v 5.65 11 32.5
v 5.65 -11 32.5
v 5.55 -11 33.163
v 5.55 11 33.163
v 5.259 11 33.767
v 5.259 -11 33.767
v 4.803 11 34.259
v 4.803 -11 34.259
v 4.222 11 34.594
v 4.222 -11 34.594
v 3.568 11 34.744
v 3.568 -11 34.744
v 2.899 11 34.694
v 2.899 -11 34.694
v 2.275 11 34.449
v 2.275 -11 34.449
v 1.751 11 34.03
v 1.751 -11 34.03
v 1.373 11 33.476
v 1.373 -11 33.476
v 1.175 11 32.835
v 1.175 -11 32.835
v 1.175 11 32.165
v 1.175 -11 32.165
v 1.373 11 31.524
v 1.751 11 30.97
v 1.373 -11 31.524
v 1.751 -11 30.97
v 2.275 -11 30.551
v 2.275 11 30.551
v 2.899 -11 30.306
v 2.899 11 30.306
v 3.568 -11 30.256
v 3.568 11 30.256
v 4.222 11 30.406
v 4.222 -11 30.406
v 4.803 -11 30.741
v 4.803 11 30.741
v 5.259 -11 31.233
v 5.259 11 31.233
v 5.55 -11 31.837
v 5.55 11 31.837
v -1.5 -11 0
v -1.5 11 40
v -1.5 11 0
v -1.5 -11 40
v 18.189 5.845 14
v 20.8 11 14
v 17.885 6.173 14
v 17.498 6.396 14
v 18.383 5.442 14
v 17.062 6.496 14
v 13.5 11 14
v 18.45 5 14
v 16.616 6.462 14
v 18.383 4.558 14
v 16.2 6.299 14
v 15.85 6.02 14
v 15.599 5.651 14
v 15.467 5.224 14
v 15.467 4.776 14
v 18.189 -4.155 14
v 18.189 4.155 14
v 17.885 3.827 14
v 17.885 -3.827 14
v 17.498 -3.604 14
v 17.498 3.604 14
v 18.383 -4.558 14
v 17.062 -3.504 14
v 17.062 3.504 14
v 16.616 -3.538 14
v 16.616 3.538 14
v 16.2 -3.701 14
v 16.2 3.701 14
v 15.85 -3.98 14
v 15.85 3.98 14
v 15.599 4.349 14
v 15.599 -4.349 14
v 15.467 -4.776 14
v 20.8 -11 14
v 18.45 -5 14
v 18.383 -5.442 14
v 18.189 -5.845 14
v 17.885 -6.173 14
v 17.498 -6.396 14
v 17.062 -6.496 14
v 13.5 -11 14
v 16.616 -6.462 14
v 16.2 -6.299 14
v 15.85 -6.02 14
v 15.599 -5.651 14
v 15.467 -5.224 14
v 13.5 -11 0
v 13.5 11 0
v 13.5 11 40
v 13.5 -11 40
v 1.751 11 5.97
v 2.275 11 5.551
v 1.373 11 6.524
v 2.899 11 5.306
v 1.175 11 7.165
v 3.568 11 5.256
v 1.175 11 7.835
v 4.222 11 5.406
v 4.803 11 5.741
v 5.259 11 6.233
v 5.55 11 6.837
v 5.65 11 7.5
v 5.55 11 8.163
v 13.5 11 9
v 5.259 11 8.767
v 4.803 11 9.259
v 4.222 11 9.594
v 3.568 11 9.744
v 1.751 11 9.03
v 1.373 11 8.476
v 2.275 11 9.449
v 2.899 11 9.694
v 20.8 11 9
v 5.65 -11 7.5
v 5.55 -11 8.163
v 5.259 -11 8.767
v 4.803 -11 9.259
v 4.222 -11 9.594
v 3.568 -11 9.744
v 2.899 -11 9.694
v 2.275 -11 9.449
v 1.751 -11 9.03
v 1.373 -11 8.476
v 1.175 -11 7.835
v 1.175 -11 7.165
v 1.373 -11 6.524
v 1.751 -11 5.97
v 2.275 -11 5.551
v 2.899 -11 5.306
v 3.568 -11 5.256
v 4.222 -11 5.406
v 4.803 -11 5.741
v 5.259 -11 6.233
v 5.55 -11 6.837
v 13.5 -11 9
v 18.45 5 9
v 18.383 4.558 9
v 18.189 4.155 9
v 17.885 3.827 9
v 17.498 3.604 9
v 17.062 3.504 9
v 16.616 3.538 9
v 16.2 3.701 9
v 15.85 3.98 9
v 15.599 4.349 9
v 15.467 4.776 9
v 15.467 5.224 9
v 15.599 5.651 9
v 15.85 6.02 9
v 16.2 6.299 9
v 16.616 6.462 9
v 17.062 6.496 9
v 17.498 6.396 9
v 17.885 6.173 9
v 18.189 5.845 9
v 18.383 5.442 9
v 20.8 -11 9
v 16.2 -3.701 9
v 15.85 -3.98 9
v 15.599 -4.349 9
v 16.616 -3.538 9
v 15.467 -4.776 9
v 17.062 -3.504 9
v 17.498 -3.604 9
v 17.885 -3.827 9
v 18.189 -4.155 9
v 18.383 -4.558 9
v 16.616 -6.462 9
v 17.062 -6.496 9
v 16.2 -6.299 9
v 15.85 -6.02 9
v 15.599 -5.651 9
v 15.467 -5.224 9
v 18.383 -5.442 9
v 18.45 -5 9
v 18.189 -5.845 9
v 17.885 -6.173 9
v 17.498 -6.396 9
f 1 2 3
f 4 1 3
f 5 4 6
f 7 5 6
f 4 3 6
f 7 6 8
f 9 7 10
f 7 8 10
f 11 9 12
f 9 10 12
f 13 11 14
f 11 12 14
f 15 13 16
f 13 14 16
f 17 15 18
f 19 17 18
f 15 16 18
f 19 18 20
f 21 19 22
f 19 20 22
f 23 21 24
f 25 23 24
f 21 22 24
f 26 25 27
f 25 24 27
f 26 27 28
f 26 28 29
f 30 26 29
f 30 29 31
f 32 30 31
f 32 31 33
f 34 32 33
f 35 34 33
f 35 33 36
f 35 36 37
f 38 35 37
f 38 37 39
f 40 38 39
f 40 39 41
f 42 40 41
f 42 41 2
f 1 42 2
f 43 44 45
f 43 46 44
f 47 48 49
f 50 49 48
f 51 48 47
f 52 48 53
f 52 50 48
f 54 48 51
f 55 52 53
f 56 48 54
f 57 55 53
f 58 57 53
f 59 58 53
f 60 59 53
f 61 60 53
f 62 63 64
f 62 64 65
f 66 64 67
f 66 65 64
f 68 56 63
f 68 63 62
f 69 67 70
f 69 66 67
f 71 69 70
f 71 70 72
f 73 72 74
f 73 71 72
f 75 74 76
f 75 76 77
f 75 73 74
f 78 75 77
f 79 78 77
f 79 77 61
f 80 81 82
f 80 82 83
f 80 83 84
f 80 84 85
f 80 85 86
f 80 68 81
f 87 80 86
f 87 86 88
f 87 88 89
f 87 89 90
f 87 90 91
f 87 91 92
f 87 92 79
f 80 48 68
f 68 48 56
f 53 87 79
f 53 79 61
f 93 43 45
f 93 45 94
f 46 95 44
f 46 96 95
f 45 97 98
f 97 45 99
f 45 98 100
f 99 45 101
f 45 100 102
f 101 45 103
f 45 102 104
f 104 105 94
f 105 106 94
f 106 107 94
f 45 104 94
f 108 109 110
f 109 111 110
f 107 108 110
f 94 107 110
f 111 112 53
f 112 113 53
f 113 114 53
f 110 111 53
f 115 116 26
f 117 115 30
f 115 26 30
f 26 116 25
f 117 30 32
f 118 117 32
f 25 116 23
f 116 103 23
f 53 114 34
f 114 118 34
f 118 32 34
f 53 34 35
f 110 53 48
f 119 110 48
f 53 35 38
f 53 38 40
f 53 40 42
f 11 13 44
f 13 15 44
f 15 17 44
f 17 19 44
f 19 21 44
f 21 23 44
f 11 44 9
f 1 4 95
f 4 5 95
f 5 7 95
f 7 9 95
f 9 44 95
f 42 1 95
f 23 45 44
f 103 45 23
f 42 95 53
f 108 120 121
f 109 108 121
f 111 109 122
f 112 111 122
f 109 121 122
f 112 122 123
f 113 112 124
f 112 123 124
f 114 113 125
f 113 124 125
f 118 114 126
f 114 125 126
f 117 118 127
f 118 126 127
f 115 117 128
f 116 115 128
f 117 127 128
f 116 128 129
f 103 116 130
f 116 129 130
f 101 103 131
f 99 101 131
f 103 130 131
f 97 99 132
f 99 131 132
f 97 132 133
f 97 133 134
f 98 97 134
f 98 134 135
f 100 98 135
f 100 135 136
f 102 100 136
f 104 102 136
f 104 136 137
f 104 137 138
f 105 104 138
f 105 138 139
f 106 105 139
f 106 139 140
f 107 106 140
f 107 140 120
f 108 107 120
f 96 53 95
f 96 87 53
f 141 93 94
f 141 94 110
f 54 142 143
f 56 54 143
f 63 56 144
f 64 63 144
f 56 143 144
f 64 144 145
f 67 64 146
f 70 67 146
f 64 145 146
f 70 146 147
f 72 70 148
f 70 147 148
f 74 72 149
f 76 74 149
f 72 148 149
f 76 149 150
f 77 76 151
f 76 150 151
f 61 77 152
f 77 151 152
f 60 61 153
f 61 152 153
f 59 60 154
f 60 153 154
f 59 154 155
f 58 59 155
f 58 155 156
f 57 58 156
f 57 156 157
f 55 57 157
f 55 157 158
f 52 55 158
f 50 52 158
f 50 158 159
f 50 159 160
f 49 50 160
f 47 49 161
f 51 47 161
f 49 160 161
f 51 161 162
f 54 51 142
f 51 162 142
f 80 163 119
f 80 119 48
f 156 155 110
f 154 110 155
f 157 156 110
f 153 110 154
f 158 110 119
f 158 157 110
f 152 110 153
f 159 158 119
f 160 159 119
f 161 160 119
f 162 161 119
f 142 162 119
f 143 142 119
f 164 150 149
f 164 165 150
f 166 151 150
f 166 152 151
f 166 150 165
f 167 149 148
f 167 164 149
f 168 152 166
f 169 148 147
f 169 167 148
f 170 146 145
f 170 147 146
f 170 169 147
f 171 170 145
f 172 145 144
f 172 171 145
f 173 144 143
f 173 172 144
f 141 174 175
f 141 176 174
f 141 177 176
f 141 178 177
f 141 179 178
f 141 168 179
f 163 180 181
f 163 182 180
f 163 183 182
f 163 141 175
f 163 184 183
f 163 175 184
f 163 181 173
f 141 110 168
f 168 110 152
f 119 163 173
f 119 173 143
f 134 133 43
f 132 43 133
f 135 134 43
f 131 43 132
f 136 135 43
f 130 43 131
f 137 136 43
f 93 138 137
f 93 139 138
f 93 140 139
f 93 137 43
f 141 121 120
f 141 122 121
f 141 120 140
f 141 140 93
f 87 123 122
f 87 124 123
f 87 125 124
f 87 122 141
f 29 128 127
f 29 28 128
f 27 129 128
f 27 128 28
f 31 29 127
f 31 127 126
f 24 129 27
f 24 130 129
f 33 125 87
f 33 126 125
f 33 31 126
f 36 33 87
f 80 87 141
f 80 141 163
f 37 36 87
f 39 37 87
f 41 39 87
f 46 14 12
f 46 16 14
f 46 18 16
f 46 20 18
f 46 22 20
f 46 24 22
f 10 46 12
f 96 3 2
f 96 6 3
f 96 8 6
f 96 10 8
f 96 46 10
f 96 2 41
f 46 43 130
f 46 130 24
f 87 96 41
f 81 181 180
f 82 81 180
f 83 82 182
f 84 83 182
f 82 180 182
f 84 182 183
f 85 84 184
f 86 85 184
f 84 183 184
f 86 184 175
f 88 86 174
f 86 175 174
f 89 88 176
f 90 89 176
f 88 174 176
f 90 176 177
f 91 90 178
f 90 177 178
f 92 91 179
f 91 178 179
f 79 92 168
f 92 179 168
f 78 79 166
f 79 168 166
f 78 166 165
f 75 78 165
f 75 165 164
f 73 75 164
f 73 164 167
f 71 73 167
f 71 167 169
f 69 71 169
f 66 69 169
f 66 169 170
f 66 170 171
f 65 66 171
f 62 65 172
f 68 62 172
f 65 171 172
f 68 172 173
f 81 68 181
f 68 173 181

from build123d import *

# Parameters (mm, degrees)
PAD_DEPTH       = 11
SKETCH004_R     = 2.25
POCKET003_DEPTH = 25
SKETCH005_R     = 1.5
POCKET004_DEPTH = 5


with BuildPart() as part:
    # Sketch → Pad (new body, symmetric)
    with BuildSketch(Plane.XZ):
        Polygon((-1.5, 40), (-1.5, 0), (13.5, 0), (13.5, 9), (20.8, 9), (20.8, 14), (13.5, 14), (13.5, 40), align=None)
    extrude(amount=PAD_DEPTH, both=True)

    # Sketch004 (on Face10 of Pad) → Pocket003 (cut)
    with BuildSketch(Plane.XZ.offset(11)):
        with Locations((3.4, 32.5)):
            Circle(SKETCH004_R)
        with Locations((3.4, 7.5)):
            Circle(SKETCH004_R)
    extrude(amount=-POCKET003_DEPTH, mode=Mode.SUBTRACT)

    # Sketch005 (on Face9 of Pocket003) → Pocket004 (cut)
    with BuildSketch(Plane(origin=(0, 0, 9), x_dir=(1, 0, 0), z_dir=(0, 0, -1))):
        with Locations((16.95, 5)):
            Circle(SKETCH005_R)
        with Locations((16.95, -5)):
            Circle(SKETCH005_R)
    extrude(amount=-POCKET004_DEPTH, mode=Mode.SUBTRACT)


solid = part.part
